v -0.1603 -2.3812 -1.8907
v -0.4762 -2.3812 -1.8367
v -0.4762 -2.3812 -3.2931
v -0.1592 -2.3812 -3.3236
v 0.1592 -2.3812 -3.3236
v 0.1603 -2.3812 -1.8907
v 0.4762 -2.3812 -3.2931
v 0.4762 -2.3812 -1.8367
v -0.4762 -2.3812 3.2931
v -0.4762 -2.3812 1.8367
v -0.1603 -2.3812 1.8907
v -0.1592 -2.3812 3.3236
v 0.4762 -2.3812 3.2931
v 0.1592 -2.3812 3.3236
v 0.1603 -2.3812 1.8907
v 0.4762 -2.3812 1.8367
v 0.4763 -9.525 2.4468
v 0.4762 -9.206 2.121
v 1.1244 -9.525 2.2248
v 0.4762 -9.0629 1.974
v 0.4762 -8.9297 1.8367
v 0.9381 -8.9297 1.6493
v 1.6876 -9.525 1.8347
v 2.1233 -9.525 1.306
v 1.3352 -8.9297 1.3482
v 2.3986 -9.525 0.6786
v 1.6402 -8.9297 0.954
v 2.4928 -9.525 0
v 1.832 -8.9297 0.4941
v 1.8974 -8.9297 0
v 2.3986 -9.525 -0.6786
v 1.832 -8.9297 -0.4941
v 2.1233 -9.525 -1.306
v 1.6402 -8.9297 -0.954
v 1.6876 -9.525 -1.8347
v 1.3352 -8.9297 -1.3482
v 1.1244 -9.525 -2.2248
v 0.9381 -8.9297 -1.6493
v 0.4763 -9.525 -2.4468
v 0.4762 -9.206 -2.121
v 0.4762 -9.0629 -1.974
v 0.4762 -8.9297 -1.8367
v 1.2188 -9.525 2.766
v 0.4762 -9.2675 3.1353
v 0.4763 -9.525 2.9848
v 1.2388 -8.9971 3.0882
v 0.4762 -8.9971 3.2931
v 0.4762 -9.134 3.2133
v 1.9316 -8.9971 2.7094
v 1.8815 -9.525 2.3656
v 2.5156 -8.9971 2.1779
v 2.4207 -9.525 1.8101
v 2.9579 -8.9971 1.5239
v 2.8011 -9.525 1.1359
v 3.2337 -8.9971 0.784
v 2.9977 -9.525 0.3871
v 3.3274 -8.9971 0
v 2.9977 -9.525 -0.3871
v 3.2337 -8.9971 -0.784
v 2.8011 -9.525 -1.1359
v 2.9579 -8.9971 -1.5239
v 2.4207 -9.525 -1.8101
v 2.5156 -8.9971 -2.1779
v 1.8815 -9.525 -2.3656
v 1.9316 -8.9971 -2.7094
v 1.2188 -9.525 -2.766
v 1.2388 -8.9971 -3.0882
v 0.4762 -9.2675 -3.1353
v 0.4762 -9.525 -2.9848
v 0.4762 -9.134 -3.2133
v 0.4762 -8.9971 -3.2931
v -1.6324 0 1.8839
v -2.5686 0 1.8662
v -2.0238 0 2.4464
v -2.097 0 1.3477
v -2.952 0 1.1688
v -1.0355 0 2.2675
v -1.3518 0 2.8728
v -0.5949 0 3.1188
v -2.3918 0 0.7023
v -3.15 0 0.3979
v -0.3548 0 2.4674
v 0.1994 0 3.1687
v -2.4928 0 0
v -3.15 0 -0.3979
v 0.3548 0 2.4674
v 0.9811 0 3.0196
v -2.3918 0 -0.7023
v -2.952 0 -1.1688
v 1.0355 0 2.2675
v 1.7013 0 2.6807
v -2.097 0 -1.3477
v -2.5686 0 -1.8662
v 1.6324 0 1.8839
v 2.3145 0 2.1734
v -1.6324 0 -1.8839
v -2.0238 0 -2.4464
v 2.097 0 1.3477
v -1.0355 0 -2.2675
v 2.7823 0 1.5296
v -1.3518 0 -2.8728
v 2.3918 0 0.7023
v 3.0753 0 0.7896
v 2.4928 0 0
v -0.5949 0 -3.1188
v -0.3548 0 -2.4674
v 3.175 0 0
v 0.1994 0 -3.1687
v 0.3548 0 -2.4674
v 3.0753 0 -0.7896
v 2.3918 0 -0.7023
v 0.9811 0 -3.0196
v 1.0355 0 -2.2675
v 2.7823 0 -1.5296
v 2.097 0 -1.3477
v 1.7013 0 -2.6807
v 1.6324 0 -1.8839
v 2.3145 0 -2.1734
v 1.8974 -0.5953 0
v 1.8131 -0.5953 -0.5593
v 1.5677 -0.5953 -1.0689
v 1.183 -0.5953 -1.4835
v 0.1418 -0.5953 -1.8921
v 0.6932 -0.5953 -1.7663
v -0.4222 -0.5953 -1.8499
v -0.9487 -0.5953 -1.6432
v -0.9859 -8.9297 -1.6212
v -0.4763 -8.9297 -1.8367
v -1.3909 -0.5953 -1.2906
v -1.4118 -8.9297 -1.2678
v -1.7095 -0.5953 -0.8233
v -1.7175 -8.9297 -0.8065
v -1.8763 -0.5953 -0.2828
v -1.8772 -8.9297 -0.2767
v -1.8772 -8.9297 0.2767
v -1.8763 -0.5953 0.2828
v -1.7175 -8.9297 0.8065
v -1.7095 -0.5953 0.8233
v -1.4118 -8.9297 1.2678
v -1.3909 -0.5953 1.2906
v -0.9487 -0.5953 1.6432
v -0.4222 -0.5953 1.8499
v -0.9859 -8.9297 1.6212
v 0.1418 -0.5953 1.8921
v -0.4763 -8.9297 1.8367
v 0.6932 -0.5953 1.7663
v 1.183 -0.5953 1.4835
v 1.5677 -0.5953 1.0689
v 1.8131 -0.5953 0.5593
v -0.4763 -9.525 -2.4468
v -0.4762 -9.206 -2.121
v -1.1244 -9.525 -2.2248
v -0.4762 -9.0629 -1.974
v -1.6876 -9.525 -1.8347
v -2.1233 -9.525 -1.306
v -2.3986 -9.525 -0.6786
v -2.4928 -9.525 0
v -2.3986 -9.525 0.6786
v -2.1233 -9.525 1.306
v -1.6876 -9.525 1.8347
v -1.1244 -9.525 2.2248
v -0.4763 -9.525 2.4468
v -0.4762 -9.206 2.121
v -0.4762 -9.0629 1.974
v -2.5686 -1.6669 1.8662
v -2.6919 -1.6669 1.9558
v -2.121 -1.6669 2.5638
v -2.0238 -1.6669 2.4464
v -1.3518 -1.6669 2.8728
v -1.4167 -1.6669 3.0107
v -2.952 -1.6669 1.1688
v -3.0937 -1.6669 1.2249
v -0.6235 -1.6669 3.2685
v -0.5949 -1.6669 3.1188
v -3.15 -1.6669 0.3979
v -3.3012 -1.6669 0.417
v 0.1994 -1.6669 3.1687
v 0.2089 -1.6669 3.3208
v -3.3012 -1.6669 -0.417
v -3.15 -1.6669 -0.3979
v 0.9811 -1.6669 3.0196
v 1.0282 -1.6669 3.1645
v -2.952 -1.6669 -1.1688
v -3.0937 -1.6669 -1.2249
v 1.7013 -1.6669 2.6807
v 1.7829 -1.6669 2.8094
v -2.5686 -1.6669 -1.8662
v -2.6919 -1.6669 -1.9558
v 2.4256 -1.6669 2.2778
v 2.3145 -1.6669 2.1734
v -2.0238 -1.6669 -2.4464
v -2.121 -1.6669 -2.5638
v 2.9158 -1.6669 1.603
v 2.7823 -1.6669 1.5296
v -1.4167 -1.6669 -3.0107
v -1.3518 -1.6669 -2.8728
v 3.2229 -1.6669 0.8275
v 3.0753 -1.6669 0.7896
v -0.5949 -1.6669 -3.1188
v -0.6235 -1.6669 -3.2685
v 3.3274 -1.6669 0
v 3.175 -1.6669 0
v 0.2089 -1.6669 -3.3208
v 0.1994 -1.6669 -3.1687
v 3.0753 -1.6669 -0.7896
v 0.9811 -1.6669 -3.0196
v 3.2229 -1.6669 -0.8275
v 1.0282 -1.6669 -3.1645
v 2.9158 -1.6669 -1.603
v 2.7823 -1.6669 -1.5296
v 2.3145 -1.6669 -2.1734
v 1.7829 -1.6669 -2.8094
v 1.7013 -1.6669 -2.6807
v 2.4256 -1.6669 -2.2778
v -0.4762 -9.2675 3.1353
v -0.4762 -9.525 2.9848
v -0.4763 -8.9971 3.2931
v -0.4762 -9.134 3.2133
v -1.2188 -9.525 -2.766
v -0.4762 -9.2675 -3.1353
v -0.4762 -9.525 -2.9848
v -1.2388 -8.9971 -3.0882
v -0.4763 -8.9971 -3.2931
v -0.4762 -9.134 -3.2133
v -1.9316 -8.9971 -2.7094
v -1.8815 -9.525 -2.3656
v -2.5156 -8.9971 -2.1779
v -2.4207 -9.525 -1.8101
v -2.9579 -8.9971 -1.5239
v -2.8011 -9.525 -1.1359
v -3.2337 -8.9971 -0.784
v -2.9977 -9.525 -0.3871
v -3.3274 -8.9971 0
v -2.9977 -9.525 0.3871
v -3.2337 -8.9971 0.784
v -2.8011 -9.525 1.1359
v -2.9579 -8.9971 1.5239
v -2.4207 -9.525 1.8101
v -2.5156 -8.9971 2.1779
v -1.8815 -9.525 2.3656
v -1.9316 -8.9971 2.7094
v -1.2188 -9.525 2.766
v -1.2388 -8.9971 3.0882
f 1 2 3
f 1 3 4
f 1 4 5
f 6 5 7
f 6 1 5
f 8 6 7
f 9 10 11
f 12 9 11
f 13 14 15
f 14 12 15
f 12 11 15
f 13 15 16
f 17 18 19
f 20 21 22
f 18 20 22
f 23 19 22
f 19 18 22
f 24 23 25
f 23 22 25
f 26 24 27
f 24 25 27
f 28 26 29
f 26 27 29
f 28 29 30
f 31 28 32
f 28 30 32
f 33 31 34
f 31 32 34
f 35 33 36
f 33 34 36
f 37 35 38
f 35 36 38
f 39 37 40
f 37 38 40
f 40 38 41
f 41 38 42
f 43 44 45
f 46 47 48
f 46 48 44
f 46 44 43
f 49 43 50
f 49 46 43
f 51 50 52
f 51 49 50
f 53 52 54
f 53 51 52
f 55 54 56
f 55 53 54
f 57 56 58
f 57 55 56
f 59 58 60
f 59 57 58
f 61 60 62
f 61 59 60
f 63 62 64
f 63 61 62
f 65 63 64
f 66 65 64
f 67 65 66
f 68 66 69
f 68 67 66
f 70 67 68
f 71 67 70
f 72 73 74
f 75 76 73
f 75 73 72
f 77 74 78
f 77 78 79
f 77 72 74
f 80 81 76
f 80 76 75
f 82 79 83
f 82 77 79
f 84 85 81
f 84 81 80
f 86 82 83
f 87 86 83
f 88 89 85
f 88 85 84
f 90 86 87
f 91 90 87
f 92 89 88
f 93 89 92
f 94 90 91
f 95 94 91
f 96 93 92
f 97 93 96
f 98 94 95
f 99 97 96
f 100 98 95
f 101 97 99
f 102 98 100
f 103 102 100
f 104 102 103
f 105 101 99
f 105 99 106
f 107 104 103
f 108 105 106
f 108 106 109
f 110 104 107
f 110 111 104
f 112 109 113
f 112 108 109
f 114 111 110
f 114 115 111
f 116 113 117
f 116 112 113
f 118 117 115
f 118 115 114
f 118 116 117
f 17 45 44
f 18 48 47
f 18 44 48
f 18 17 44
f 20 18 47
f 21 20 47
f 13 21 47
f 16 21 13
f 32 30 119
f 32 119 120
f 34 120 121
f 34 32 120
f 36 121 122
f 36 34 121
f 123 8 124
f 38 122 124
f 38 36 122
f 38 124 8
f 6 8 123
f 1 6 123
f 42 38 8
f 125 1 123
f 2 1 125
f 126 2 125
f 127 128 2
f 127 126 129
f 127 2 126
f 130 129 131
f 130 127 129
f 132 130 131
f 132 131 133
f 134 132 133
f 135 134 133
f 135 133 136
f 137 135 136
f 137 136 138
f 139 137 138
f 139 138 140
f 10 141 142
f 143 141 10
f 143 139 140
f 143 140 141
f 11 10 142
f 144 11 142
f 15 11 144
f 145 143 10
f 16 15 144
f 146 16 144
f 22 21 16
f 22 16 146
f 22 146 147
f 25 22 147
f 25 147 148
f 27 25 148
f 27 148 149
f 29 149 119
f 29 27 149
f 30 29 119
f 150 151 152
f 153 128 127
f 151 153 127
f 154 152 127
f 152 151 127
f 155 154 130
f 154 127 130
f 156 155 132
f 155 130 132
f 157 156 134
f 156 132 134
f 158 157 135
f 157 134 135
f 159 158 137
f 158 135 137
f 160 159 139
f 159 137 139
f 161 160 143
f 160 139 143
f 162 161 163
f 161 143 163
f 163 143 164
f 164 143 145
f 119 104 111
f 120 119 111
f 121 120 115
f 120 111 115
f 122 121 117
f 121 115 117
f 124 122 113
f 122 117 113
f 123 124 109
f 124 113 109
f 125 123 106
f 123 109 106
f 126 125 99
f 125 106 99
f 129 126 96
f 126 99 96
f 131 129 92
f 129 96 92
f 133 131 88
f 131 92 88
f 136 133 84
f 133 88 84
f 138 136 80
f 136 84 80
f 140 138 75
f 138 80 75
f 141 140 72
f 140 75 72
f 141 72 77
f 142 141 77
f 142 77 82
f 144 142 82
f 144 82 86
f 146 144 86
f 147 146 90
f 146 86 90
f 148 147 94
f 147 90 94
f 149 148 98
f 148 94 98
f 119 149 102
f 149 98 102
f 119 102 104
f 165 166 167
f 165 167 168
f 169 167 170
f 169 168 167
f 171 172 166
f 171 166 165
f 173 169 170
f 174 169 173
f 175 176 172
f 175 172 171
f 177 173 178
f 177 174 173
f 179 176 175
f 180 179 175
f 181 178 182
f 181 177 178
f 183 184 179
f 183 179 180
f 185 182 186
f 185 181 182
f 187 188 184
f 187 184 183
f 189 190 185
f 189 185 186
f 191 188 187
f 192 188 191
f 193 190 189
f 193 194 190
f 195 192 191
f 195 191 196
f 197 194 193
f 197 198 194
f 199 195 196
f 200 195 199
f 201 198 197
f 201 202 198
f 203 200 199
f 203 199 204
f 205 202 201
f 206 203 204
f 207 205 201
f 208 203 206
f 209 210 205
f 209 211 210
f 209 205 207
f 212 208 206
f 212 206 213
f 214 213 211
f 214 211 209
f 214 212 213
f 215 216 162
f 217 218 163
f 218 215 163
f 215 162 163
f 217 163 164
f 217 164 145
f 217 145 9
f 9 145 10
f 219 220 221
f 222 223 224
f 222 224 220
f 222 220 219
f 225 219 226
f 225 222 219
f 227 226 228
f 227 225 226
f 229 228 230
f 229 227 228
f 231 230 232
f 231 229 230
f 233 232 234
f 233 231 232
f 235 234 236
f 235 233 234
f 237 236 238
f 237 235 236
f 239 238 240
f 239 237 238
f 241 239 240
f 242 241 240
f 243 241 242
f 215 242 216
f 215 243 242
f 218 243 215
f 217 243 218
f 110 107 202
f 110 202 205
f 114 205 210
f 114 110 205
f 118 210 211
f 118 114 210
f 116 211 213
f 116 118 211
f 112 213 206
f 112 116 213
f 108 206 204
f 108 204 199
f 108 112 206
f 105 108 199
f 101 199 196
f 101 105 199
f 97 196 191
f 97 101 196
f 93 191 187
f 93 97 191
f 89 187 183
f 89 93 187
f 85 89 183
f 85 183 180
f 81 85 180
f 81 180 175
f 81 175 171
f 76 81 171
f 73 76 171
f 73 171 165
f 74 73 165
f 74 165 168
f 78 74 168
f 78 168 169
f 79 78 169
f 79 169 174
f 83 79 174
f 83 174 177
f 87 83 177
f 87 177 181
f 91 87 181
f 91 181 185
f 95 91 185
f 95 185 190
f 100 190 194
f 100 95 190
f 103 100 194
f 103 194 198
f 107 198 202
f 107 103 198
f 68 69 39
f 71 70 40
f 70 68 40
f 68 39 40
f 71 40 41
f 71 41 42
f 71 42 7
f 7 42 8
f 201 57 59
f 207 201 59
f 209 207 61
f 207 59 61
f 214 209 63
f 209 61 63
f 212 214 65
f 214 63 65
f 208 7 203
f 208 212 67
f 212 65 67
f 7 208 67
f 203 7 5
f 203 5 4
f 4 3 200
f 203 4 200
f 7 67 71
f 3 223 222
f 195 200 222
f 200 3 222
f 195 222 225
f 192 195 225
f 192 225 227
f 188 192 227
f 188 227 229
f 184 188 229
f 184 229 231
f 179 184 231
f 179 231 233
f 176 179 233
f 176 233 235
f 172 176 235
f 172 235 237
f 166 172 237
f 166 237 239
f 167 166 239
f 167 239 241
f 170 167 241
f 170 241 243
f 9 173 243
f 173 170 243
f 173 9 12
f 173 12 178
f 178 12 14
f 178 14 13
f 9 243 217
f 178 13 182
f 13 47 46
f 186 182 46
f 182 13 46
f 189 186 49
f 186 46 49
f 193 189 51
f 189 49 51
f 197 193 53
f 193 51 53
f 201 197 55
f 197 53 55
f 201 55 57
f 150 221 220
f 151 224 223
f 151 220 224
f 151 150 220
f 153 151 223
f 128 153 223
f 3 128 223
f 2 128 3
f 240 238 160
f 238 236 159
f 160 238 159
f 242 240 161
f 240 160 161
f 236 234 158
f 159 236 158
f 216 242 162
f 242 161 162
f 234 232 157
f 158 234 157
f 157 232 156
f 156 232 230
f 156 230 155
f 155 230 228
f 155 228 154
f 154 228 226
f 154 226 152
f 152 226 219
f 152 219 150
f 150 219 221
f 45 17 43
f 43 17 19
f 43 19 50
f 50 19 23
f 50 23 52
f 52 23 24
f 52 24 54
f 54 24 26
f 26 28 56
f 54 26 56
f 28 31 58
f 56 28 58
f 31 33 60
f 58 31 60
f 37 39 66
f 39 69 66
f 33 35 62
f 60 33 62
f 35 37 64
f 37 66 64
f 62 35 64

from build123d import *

# Parameters (mm, degrees)
SKETCH1_R           = 3.175
EXTRUDE1_DEPTH      = 9.525
EXTRUDE2_START      = -9.525
SKETCH1_4_R         = 3.3274
SKETCH1_4_R_2       = 3.175
EXTRUDE2_DEPTH      = 7.858125
EXTRUDE3_START      = -9.525
SKETCH4_R           = 1.897444252
EXTRUDE3_DEPTH      = 9.525
CHAMFER1_SIZE       = 0.5953125
CHAMFER2_SIZE       = 0.3048
CHAMFER2_SIZE2      = 0.527929086
SKETCH8_W           = 0.9525
SKETCH8_H           = 7.14375
EXTRUDE4_DEPTH      = 4.3274
EXTRUDE4_DEPTH_BACK = 4.3274


with BuildPart() as part:
    # Sketch1 → Extrude1 (new body)
    with BuildSketch(Plane(origin=(0, 0, 0), x_dir=(1, 0, 0), z_dir=(0, 1, 0))):
        Circle(SKETCH1_R)
    extrude(amount=-EXTRUDE1_DEPTH)

    # Sketch1<4> → Extrude2 (add)
    with BuildSketch(Plane(origin=(0, 0, 0), x_dir=(1, 0, 0), z_dir=(0, 1, 0)).offset(EXTRUDE2_START)):
        Circle(SKETCH1_4_R)
        Circle(SKETCH1_4_R_2, mode=Mode.SUBTRACT)
    extrude(amount=EXTRUDE2_DEPTH)

    # Sketch4 → Extrude3 (cut)
    with BuildSketch(Plane(origin=(0, 0, 0), x_dir=(1, 0, 0), z_dir=(0, 1, 0)).offset(EXTRUDE3_START)):
        Circle(SKETCH4_R)
    extrude(amount=EXTRUDE3_DEPTH, mode=Mode.SUBTRACT)

    # Chamfer1
    chamfer1_edges = [part.edges().sort_by_distance(p)[0] for p in [
        (-1.897444252, -9.525, 0),
        (-1.897444252, 0, 0),
    ]]
    chamfer(chamfer1_edges, length=CHAMFER1_SIZE)

    # Chamfer2
    chamfer2_edges = [part.edges().sort_by_distance(p)[0] for p in [
        (-3.3274, -9.525, 0),
    ]]
    chamfer2_side = [part.faces().sort_by_distance(p)[0] for p in [
        (-2.586869836, -9.525, 0),
    ]]
    chamfer(chamfer2_edges, length=CHAMFER2_SIZE, length2=CHAMFER2_SIZE2, reference=chamfer2_side[0])

    # Sketch8 → Extrude4 (cut, two sides)
    with BuildSketch(Plane.XY) as extrude4_sk:
        with Locations((0, -5.953125)):
            Rectangle(SKETCH8_W, SKETCH8_H)
    extrude(amount=EXTRUDE4_DEPTH, mode=Mode.SUBTRACT)
    extrude(extrude4_sk.sketch, amount=-EXTRUDE4_DEPTH_BACK, mode=Mode.SUBTRACT)


solid = part.part
